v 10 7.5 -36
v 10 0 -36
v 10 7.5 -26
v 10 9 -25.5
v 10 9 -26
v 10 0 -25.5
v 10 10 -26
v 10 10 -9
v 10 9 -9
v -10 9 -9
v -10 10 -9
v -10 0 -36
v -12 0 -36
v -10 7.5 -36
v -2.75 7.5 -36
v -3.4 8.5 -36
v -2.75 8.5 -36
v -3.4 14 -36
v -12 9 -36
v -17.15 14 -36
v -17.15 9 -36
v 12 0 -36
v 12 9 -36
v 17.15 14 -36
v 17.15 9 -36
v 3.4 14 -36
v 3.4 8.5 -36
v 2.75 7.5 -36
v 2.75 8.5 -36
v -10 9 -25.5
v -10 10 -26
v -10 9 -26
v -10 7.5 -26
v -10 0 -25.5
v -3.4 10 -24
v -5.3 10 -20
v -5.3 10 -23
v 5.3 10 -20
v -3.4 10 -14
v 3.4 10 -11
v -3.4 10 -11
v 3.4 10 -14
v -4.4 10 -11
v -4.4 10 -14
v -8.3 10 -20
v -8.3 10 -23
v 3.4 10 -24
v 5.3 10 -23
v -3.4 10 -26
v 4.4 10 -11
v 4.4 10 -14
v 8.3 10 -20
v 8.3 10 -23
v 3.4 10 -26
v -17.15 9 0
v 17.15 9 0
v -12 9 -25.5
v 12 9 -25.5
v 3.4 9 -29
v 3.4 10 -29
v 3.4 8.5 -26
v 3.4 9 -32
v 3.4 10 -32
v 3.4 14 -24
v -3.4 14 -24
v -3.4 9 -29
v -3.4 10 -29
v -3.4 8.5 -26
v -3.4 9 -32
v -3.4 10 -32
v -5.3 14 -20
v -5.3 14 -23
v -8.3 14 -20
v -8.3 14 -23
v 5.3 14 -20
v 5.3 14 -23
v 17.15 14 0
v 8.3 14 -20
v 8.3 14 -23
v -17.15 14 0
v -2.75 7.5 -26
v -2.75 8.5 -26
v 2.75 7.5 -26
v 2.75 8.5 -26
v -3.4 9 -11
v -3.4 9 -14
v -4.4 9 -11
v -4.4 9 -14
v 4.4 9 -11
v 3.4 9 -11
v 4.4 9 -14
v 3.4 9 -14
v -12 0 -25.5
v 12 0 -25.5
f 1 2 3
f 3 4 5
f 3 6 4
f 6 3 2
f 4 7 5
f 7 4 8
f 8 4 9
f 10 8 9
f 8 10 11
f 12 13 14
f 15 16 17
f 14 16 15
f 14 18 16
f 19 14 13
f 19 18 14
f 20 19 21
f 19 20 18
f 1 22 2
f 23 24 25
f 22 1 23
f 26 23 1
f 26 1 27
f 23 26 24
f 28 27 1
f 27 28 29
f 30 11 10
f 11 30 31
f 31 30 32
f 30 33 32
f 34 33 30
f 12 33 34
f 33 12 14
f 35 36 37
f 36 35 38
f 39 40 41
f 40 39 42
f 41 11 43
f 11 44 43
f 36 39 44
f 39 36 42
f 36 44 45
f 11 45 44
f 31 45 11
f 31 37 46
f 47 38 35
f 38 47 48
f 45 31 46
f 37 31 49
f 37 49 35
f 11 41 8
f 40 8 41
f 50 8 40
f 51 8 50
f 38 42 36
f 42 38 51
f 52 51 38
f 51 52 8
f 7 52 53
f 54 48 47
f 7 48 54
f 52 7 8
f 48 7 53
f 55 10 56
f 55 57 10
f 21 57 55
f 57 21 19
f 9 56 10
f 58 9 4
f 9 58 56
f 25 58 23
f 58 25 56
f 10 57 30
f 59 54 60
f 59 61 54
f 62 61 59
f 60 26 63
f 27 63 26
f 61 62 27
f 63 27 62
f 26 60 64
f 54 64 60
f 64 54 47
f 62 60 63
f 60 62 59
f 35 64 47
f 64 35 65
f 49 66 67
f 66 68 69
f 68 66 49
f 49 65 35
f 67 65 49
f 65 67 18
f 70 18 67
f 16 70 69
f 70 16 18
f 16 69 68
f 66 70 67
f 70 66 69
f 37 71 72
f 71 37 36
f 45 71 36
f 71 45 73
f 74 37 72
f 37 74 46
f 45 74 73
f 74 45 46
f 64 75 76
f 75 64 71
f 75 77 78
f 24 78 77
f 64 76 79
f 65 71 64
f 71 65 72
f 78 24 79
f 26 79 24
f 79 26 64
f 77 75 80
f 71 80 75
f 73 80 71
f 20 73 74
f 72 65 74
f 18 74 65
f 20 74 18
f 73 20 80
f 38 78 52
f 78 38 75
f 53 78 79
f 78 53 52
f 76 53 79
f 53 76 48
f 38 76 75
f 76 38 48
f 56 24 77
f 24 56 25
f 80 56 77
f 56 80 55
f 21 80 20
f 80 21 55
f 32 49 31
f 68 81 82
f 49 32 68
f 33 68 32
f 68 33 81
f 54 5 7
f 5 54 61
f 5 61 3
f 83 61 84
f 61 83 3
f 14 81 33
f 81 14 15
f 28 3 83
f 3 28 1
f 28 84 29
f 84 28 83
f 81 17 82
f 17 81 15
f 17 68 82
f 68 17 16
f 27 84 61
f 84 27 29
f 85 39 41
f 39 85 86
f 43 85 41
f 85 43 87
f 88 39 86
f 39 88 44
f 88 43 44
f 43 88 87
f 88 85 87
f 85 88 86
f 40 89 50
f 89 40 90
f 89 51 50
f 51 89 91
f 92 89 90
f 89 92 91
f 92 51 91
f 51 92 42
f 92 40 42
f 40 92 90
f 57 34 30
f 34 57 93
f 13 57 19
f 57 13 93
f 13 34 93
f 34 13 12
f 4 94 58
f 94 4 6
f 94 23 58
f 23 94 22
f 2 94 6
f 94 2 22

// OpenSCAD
// file: HelpMethods/triangle.scad
module triangle(c, height, betha)
{ 
    c_right=height*cos(betha);
    c_left=-c+height*cos(betha);
    // draw triangle c=x, C=[0,heigth]
    polygon(points=[ [c_left,0], [c_right,0], [0,height] ]);
}

module isosides_triangle(a)
{
      height= sin(60)*a;
    // draw triangle c=x, C=[0,heigth]
      polygon(points=[ [-a/2,0], [a/2,0], [0,height] ]);
}

module isosceles_triangle(c,height)
{
    // draw triangle c=x, C=[0,heigth]
     polygon(points=[ [-c/2,0], [c/2,0], [0,height] ]);
}

module rightangular_triangle(width, height)
{
      // draw triangle c=x, C=[0,heigth]
     polygon(points=[ [0,0], [width,0], [0,height] ]);
}

rightangular_triangle(2,2);
// file: HelpMethods/SnapLib.0.36.scad
/*simple Snap library based on "Snap-Fit Joints for Plastics - A Design Guid" by Bayer MaterialScience LLC 
  http://fab.cba.mit.edu/classes/S62.12/people/vernelle.noel/Plastic_Snap_fit_design.pdf
 
 on http://www.thingiverse.com/thing:1860118
 
    by fpetrac Fausto Petraccone fpetrac@gmail.com 
    Licensed under the Creative Commons - Attribution - Non-Commercial license.
*/

/*Rev
    SnapLib 0.36.scad: added SnapHoleY function  
    SnapLib 0.35.scad: on RSnapY added a check to avioid interference of lobes during closure; on RRSnappY added a check to avioid overlapped lobes.
    SnapLib 0.30.scad  added function Hsnap and Snap to calculate the snap H or Y for cantilever snap
    SnapLib 0.25.scad  added Scale factor f to reduce the calculate value h or y (this mantain the snap on unbreakable zone when f>1)
    SnapLib 0.20.scad  Bug Fix
    SnapLib 0.10.scad  added RSnapY RRSnapY
    SnapLib 0.00.scad  first release
*/


/*
eps=0.5*6/100;//Elongation at break of PLA=6%
eps=0.5*12/100;//Elongation at break of ABS=12%
eps=0.5*18/100;//Elongation at break of PETG=18%
*/

eps=0.5*6/100;//Elongation at break of PLA=6%


function Hsnap(l,y,f)= (1.09/f)*(eps*pow(l,2))/(y);
function Ysnap(l,h,f)= (1.09/f)*(eps*pow(l,2))/(h);

//SnapH(l,y,a,b,f=1) Define y calculate h and divide the calculte h value to a factor f
module SnapH(l,y,a,b,f=1)   
{
    h=Hsnap(l,y,f);
    p=y;
    echo("h is",h);
linear_extrude(height = b, center = f, convexity = 10, twist = 0)
polygon([[0,0],[l,0],[l,y],[l+p,y],[l+p+(y+h/4)/tan(a),-h/4],[l,-h/2],[0,-h]]);
}
//SnapY(l,h,a,b,f=1) Define h calculate y and divide the calculte y value to a factor f
module SnapY(l,h,a,b,f=1)
{
    y=Ysnap(l,h,f);
    p=y;
    echo("y is", y);
linear_extrude(height = b, center = f, convexity = 10, twist = 0)
polygon([[0,0],[l,0],[l,y],[l+p,y],[l+p+(y+h/4)/tan(a),-h/4],[l,-h/2],[0,-h]]);
}
//SnapHoleY(l,h,a,b,f=1,Pr=2) Define h calculate y and divide the calculte y value to a factor f the total hole depth is h*PR
module SnapHoleY(l,h,a,b,f=1,Pr=2){
        //%SnapY(l,h,a,b);  
        y=Ysnap(l,h,f);
        YY=Pr*h;//depth Y;
        XX=1.1*(y+(y+h/4)/tan(a)); //Altezza totale +10%
        ZZ=0+b; //largezza piu tolleranza
        union(){
            translate([0,-YY,(b-ZZ)/2])cube([l,YY,ZZ],center=false); //gambo
            translate([l,-YY,(b-ZZ)/2])cube([XX,YY+y,ZZ],center=false);//testa
        }    
 }



//Define h calculate y and divide the calculated value to f
module RSnapY(l,h,a,Lobi,r2,f=1,K2=2)   
{
    Theta=180/Lobi;
    y=(1.64/f)*K2*(eps*pow(l,2))/(r2);
    p=y;
    echo("y is", y);
    echo("r1/r2",(r2-h)/r2);
    echo("Theta", Theta);
    echo("r2-h",(r2-h));
    if(((r2-h)>y)&&(h<r2)){ //(r2-h)>y should be (r2-h/2)>y and  h<r2 for scad problem
      for(f=[0:1:Lobi])
          rotate([0,0,Theta*2*f])
              rotate_extrude(angle = Theta, convexity = 2,$fn=200)
                  translate([r2,0,0])
                      mirror([1,-1,0])
                          polygon([[0,0],[l,0],[l,y],[l+p,y],[l+p+(y+h/4)/tan(a),-h/4],[l,-h/2],[0,-h]]);
    }
    else{
      echo ("<b>WARNING:</b>");
      echo("y should be < r2-h ");
      echo("h should be < r2 ");
    }
}
//Define h calculate y and divide the calculated value to f
module RRSnapY(l,h,a,Lobi,r2,f=1,K1=2)
{
    Theta=180/Lobi;
    y=(1.64/f)*K1*(eps*pow(l,2))/(r2);
    p=y;
    echo("y is", y);
    echo("r1/r2",(r2-h)/r2);
    echo("Theta", Theta);
    echo("r2-y",(r2-y));
    if(y<r2){
      for(f=[0:1:Lobi])
          rotate([0,180,Theta*2*f])
              rotate_extrude(angle = Theta, convexity = 2,$fn=200)
                  translate([r2,0,0])
                      mirror([1,1,0])
                          polygon([[0,0],[l,0],[l,y],[l+p,y],[l+p+(y+h/4)/tan(a),-h/4],[l,-h/2],[0,-h]]);
  }
      else{
      echo ("<b>WARNING:</b>");
      echo("y should be < r2 ");
      }
}
// file: HelpMethods/holder_triangle.scad
// holder triangle
use <triangle.scad>

module holder_triangle(space=[20,20],clearance=2, fillout=1)
    {
      translate([0,-space[0]/2,0])rotate([0,-90,0]) linear_extrude(height = space[1]*fillout, center = true) {rightangular_triangle(clearance,clearance);}
    }
    
 holder_triangle();
// main file
//printhead for connection with pin contact cable

// libaries
use <HelpMethods/holder_triangle.scad>
use <HelpMethods/SnapLib.0.36.scad>

//<<<<<<<<<<<<<<<Execution>>>>>>>>>>>>>>
//printhead_bottom();
printhead_top();
//plate_clamp();
//<<<<<<<<<<<<<<<<<>>>>>>>>>>>>>>>>>
// functions
// import
//------------------------------
// variables in mm, select NP_width
//nozzle plate big
NP_height = 1.3;
//NP_width = 6.9;
NP_offset_z = 9;

//nozzle plate small
NP_width = 6.8;
 
CPNP_distance = 9;

//plate holder
PH_length = 3;
PH_width = 1;
PH_distance = 15;
PH_offset = 2;  

fill_window_x = NP_width;
fill_window_y = 10;
fill_window_z = 12;

// contact plate
CP_width = 30.5;
CP_depth= 20.5;
CP_height = 2;

// printhead top
PT_outside_x = 34.3; // old =34.3
PT_outside_y = 5;
PT_outside_z = 36;

PT_inside_x = 20;
PT_inside_y = 1;
PT_inside_z = PT_outside_z - NP_offset_z;

//plate clamp hole
PC_snap_width_z = 2;
PC_snap_play = 1;
PC_snap_height_y = PT_outside_y - PT_inside_y + NP_height;
PC_snap_deep_x = 2;
PC_space =  NP_width + 3.8 ; //war vorher + 4
PC_snap_space = PC_space / PC_snap_play;
PC_offset_z = 11;

PC_hole_width_z = PC_snap_width_z + 1;
PC_hole_height_x = 3;
PC_hole_deep_y = PT_outside_y;

PC_hole_position_x = PC_space/2 + PC_hole_height_x;
PC_hole_position_y = CPNP_distance;
PC_hole_position_z = NP_offset_z + PC_offset_z + PC_hole_width_z;

// plate clamp 
PC_clamp_thick = 2;
PC_clamp_width = PC_snap_space + 2*PC_snap_deep_x;
PC_clamp_height= PC_snap_width_z;

PC_clamp_position_x = PC_clamp_width/2;
PC_clamp_position_y = CPNP_distance + PT_inside_y - PC_clamp_thick -NP_height;
PC_clamp_position_z = NP_offset_z + PC_offset_z + PC_clamp_height; 

// printhead bottom
PB_outside_x = 40;
PB_outside_y = 9;
PB_outside_z = 37;

PB_inside_x = CP_width;
PB_inside_y = PB_outside_y - CP_height;
PB_inside_z = 25;

// printspace
PS_x = 30;
PS_y = 10;
PS_z = 10;

// snap
snap_play = 0.98;
snap_distance = 17;
snap_offset_z = 10;

// stop and windstopper printhead top
SPT_x = 2;
SPT_y = 9;
SPT_z = 10.5; //war 10
SPT_offset_z = 25.5; //war 25

// stop contact plate
SCP_x = 5;
SCP_y = 2;
SCP_z = 2;

// Nozzleplate big
module NozzlePlate(){
     translate([0,9,-14.2]) import("nozzle platine/Nozzle Plate Hp big.stl");
}

// spring contacts
module contacts(){
     translate([0,1.5,-16]) import("contact platine/contact platine solo.stl");
}
//--------------------------------
module printhead_top(){
    difference(){
// outside
    translate([-PT_outside_x/2,CPNP_distance,-PT_outside_z])cube([PT_outside_x,PT_outside_y,PT_outside_z]);
	union(){
// inside
    translate([-PT_inside_x/2,CPNP_distance,-PT_outside_z])cube([PT_inside_x,PT_inside_y,PT_inside_z]);
// fillwindow
    translate([-fill_window_x/2,CPNP_distance,-PT_outside_z])cube([fill_window_x,fill_window_y,fill_window_z]);
// print clamp hole
    printhead_clamp_hole();
    mirror ([1,0,0]) printhead_clamp_hole();
        }
	}
    difference() {
    translate([0, 9, -31]) cube([20, 3, 10], center=true);
    translate([0, 8, -31]) cube([5.5, 5, 10], center=true);
    translate([-NP_width/2, 8.5, -36]) cube([NP_width, 2, 10]);
    }
    
// printhead clamp_hole
module printhead_clamp_hole(){
    translate ([-PC_hole_position_x, PC_hole_position_y, -PC_hole_position_z ]) cube([PC_hole_height_x, PC_hole_deep_y, PC_hole_width_z]);
}
//stopper
module stopper(){
    translate([-SPT_x - PT_inside_x/2,CPNP_distance - SPT_y,-SPT_offset_z - SPT_z]) cube([SPT_x, SPT_y, SPT_z]);
    }
    stopper();
    mirror ([1,0,0]) stopper();
//plate holder
    Plate();
}
// bottom
module printhead_bottom(){    
    difference() {  
    translate([-PB_outside_x/2,0,-PB_outside_z]) cube([PB_outside_x,PB_outside_y,PB_outside_z]);
    // plate space
    union(){
// Contact plate space
	translate([-PB_inside_x/2,CP_height, -PB_inside_z]) cube([PB_inside_x, PB_inside_y, PB_inside_z]);
// Print space
    translate([-PS_x/2,0,-PB_outside_z])cube ([PS_x,PS_y,PS_z]);
    }
//holes for mounting screws (to X_moving)
    translate([17.75, 4.5, -7]) cylinder(h=10, r=1); 
    translate([-17.75, 4.5, -7]) cylinder(h=10, r=1); 
    }
    snap();
    mirror([1,0,0])snap();
    translate([0,0,-snap_distance])snap();
    mirror([1,0,0]) translate([0,0,-snap_distance])snap();

    // contactplate stop
    translate([-CP_width/2,CP_height, -PB_inside_z + CP_depth-0.4]) cube([SCP_x,SCP_y,SCP_z]);
    mirror([1,0,0]) translate([-CP_width/2,CP_height, -PB_inside_z + CP_depth-0.4]) cube([SCP_x,SCP_y,SCP_z]);
//snap
module snap(){
    translate([PT_outside_x/2/snap_play, PB_outside_y, -snap_offset_z]) rotate([0,0,90])SnapY(l=PT_outside_y,h=2,a=35,b=5,f=0.5);
}
}
//Plateholder
module Plate(){
    plate_holder();
    translate ([0,0,-PH_distance - PH_length]) plate_holder();
    // holder
    module plate_holder(){
        translate([-NP_width/2 - PH_width,CPNP_distance,-NP_offset_z - PH_length - PH_offset ]) cube([PH_width,PH_width,PH_length]);
        mirror([1,0,0]) translate([-NP_width/2 - PH_width,CPNP_distance,-NP_offset_z - PH_length - PH_offset ]) cube([PH_width,PH_width,PH_length]);
    }
}

//Plate clamp
module plate_clamp(){
     translate([-PC_clamp_position_x,PC_clamp_position_y,-PC_clamp_position_z])cube([PC_clamp_width, PC_clamp_thick,PC_clamp_height]);
     // snap
     clamp();
     mirror ([1,0,0]) clamp();
     module clamp(){
	  translate([PC_snap_space/2,PC_clamp_position_y+PC_clamp_thick,-PC_clamp_position_z]) rotate([0,0,90]) SnapY(l=PC_snap_height_y,h=PC_snap_deep_x,a=35,b=PC_snap_width_z,f=0.5);
	  }
}
